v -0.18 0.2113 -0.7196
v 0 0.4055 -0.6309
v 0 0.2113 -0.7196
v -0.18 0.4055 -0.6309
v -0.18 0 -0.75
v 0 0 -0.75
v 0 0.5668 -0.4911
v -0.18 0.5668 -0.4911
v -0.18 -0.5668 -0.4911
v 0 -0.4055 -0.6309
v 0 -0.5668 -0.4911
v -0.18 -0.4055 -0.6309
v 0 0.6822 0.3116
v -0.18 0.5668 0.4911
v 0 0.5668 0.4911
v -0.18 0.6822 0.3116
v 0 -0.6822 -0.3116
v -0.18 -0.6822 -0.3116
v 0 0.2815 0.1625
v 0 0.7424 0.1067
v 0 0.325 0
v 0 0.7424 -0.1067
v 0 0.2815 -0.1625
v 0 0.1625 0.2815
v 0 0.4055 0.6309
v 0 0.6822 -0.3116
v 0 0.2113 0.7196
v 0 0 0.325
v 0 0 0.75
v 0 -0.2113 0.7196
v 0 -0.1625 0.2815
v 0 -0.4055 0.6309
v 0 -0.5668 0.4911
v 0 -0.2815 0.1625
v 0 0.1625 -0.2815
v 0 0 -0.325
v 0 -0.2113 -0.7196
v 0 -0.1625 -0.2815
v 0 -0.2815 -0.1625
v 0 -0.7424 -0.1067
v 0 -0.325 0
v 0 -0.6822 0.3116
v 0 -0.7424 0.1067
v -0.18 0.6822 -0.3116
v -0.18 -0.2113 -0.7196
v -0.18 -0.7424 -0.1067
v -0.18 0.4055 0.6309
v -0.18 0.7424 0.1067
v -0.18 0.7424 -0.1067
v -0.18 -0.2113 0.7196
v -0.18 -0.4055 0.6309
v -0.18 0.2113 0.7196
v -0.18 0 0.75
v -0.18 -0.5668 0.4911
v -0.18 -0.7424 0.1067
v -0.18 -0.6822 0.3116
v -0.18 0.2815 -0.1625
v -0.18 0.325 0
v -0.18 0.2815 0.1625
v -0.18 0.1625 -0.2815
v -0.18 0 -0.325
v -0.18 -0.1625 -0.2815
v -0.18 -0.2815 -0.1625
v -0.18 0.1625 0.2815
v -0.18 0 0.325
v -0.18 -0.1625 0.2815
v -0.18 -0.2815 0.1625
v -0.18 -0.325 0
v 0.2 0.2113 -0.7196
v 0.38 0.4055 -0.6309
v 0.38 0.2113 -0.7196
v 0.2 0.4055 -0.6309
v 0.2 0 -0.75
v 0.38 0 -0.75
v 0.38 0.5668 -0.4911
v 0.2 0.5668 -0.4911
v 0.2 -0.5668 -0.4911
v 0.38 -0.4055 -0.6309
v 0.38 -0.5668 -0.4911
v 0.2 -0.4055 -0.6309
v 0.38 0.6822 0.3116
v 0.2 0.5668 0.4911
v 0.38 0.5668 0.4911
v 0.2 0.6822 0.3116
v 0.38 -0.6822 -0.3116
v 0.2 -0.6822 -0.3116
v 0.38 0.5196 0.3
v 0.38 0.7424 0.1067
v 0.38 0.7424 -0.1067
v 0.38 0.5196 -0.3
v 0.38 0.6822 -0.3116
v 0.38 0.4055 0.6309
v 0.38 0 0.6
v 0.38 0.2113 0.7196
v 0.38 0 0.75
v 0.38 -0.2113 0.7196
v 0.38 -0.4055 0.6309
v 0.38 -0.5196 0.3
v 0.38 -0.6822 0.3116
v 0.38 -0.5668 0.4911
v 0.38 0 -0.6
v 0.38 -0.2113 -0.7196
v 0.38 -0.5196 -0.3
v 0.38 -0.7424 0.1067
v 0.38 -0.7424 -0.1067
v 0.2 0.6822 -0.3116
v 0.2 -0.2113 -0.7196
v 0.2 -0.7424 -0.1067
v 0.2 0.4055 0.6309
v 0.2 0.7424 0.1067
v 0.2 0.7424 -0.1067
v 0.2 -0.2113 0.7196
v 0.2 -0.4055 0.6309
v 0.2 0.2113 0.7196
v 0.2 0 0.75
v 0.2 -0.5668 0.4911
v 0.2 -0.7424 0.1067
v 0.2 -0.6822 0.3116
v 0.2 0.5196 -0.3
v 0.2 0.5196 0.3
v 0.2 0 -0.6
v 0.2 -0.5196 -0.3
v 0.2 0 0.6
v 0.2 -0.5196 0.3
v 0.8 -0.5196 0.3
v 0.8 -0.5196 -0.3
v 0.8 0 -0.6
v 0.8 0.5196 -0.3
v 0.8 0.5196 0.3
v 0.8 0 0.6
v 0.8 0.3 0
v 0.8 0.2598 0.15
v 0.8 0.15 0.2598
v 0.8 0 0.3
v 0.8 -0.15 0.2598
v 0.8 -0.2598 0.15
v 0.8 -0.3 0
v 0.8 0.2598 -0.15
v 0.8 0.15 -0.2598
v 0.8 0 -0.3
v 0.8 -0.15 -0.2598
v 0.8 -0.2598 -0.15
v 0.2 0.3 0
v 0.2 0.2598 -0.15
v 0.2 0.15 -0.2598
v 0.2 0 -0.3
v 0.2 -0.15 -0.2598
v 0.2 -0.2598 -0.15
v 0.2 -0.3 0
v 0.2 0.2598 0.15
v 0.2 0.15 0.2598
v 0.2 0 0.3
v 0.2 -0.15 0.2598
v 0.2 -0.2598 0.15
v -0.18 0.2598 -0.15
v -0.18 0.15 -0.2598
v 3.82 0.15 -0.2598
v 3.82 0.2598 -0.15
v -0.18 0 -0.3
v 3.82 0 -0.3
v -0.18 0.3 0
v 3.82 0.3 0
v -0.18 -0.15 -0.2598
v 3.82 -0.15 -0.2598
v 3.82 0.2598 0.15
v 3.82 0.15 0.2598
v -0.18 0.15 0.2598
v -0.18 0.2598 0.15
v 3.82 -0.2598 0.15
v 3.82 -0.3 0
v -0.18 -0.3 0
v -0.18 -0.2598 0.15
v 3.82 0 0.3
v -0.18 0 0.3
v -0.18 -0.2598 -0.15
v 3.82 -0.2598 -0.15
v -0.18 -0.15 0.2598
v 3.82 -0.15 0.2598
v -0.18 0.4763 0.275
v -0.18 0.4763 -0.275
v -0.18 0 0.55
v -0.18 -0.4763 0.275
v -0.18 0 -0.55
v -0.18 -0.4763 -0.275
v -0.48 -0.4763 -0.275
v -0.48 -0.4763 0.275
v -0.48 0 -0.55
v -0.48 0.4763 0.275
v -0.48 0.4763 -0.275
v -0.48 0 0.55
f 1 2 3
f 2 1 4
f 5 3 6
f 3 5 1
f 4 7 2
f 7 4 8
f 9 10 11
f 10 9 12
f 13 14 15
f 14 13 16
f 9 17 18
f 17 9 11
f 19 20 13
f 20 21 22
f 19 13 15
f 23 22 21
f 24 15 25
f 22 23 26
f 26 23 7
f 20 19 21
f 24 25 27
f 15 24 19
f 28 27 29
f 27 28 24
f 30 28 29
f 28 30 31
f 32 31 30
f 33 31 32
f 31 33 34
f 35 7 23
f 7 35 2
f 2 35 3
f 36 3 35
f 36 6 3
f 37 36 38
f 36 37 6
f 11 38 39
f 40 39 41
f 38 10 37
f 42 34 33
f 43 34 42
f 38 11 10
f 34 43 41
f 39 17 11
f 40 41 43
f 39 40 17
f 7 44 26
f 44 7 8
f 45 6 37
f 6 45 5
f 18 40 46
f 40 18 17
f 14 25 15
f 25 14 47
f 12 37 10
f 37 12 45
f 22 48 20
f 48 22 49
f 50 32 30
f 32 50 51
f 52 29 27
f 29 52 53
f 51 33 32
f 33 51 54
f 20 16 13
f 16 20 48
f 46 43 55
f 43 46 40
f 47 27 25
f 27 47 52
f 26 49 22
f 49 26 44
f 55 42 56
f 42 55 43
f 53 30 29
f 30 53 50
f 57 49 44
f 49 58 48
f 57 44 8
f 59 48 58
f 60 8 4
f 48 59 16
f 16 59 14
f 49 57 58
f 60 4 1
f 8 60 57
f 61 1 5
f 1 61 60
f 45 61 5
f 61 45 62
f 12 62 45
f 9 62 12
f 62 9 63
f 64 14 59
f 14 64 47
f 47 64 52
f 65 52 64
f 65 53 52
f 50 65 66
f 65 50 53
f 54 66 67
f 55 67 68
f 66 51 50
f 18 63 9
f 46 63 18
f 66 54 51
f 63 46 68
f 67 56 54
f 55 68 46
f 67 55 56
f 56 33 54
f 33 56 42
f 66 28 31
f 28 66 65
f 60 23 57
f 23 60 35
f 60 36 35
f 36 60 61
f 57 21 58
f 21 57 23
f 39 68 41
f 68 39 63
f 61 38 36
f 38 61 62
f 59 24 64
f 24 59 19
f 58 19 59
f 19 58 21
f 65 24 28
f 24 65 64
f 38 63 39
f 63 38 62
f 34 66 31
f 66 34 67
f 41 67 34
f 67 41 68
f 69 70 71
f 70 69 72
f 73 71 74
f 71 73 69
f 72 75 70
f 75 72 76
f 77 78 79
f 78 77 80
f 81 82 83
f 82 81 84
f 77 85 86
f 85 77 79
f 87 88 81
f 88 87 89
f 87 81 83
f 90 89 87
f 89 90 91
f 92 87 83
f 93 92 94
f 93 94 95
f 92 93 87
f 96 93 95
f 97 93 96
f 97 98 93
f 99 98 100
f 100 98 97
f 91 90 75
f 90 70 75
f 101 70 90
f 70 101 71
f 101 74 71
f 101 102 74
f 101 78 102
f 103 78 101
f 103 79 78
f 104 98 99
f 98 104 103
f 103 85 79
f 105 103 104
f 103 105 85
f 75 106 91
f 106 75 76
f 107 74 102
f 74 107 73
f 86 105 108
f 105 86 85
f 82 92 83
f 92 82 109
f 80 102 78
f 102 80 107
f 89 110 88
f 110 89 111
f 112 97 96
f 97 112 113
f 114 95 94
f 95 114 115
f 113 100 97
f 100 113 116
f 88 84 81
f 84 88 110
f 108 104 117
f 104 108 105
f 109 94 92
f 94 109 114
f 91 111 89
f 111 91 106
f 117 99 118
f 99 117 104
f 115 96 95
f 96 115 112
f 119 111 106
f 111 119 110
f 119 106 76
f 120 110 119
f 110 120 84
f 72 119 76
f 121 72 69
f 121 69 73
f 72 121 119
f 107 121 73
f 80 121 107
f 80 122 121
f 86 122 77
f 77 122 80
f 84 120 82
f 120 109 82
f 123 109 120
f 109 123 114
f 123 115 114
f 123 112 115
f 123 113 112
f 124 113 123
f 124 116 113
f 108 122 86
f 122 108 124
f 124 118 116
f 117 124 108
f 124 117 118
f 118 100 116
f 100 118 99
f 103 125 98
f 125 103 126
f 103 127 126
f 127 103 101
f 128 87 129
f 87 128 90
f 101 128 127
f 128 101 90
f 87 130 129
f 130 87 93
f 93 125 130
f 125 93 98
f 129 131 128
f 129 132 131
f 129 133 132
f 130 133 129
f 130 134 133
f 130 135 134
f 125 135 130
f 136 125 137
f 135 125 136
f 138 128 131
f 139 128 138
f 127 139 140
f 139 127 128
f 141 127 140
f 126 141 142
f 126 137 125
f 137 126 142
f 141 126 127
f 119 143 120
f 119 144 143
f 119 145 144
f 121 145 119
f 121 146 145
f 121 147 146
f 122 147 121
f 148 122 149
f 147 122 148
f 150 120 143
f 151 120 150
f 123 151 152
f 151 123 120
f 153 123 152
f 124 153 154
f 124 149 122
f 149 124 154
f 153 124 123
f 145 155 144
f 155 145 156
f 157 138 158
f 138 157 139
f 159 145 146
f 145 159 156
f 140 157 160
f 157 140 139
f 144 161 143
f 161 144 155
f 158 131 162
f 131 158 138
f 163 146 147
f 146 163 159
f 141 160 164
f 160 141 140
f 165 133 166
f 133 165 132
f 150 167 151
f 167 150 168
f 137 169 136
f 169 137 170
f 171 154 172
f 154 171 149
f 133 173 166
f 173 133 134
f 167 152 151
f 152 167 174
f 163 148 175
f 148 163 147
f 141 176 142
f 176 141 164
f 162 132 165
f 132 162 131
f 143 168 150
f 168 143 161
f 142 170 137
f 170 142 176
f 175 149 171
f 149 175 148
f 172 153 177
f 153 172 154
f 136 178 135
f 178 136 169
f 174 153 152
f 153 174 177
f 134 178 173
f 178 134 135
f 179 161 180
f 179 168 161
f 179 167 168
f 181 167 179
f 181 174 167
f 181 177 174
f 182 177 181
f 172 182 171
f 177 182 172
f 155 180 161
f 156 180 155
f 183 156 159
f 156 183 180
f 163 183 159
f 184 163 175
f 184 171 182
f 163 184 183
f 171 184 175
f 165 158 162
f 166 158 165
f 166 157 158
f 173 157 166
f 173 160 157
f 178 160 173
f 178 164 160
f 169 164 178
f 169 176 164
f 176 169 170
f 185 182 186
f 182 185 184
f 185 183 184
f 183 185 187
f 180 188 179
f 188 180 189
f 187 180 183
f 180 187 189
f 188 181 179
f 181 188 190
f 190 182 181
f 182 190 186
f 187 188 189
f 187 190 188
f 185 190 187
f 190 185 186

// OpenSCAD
// file: nut.scad
module nut(rotation=0) 
{
    hex_diameter = 1.2;
    hex_length = 0.6;
    hole = 0.6;
 
    
    rotate([0,90,rotation]) 
    color([0.0,0.8,1.0])
    translate([0,0,hex_length*0.5]) 
    {
        difference() {
            cylinder(h=hex_length, r=hex_diameter/2, $fn = 6, center=true);
            cylinder(h=hex_length+0.1, r=hole/2, $fn = 12, center=true);
        }
    }
}

nut();
// file: washer.scad
module washer(rotation=0, thickness = 0.08) 
{
    diameter = 1.5;
    hole = 0.65;
    
    rotate([0,90,rotation]) 
    translate([0,0,thickness*0.5]) 
    {
        difference() {
            cylinder(h=thickness, r=diameter/2, $fn = 22, center=true);
            cylinder(h=thickness+0.1, r=hole/2, $fn = 12, center=true);
        }
    }
}

washer();
// main file
use <washer.scad> 
use <nut.scad> 

module bolt(length = 4, thickness = 0.6, rotation=0, cw_w=0.2) 
{
    hex_diameter = 1.1;
    hex_length = 0.3;
    washer_thickness = 0.18;
 
    translate([-washer_thickness,0,0])
    {
        rotate([0,90,rotation]) 
        {
            color([0.4,0.4,0.8])
            cylinder(h=length, r=thickness/2, $fn = 12);
            
            color([0.4,0.4,0.8])
            translate([0,0,-hex_length]) 
                cylinder(h=hex_length, r=hex_diameter/2, $fn = 6);
        
            translate([0,0,cw_w + washer_thickness]) rotate([0,-90,0]) {
                color([0.0,0.8,1.0]) 
                washer(0, washer_thickness);
                color([0.4,0.4,0.8])
                nut(0);
            }
        }
        
        color([0.0,0.8,1.0])
        washer(rotation, washer_thickness);
    }
}

bolt();
